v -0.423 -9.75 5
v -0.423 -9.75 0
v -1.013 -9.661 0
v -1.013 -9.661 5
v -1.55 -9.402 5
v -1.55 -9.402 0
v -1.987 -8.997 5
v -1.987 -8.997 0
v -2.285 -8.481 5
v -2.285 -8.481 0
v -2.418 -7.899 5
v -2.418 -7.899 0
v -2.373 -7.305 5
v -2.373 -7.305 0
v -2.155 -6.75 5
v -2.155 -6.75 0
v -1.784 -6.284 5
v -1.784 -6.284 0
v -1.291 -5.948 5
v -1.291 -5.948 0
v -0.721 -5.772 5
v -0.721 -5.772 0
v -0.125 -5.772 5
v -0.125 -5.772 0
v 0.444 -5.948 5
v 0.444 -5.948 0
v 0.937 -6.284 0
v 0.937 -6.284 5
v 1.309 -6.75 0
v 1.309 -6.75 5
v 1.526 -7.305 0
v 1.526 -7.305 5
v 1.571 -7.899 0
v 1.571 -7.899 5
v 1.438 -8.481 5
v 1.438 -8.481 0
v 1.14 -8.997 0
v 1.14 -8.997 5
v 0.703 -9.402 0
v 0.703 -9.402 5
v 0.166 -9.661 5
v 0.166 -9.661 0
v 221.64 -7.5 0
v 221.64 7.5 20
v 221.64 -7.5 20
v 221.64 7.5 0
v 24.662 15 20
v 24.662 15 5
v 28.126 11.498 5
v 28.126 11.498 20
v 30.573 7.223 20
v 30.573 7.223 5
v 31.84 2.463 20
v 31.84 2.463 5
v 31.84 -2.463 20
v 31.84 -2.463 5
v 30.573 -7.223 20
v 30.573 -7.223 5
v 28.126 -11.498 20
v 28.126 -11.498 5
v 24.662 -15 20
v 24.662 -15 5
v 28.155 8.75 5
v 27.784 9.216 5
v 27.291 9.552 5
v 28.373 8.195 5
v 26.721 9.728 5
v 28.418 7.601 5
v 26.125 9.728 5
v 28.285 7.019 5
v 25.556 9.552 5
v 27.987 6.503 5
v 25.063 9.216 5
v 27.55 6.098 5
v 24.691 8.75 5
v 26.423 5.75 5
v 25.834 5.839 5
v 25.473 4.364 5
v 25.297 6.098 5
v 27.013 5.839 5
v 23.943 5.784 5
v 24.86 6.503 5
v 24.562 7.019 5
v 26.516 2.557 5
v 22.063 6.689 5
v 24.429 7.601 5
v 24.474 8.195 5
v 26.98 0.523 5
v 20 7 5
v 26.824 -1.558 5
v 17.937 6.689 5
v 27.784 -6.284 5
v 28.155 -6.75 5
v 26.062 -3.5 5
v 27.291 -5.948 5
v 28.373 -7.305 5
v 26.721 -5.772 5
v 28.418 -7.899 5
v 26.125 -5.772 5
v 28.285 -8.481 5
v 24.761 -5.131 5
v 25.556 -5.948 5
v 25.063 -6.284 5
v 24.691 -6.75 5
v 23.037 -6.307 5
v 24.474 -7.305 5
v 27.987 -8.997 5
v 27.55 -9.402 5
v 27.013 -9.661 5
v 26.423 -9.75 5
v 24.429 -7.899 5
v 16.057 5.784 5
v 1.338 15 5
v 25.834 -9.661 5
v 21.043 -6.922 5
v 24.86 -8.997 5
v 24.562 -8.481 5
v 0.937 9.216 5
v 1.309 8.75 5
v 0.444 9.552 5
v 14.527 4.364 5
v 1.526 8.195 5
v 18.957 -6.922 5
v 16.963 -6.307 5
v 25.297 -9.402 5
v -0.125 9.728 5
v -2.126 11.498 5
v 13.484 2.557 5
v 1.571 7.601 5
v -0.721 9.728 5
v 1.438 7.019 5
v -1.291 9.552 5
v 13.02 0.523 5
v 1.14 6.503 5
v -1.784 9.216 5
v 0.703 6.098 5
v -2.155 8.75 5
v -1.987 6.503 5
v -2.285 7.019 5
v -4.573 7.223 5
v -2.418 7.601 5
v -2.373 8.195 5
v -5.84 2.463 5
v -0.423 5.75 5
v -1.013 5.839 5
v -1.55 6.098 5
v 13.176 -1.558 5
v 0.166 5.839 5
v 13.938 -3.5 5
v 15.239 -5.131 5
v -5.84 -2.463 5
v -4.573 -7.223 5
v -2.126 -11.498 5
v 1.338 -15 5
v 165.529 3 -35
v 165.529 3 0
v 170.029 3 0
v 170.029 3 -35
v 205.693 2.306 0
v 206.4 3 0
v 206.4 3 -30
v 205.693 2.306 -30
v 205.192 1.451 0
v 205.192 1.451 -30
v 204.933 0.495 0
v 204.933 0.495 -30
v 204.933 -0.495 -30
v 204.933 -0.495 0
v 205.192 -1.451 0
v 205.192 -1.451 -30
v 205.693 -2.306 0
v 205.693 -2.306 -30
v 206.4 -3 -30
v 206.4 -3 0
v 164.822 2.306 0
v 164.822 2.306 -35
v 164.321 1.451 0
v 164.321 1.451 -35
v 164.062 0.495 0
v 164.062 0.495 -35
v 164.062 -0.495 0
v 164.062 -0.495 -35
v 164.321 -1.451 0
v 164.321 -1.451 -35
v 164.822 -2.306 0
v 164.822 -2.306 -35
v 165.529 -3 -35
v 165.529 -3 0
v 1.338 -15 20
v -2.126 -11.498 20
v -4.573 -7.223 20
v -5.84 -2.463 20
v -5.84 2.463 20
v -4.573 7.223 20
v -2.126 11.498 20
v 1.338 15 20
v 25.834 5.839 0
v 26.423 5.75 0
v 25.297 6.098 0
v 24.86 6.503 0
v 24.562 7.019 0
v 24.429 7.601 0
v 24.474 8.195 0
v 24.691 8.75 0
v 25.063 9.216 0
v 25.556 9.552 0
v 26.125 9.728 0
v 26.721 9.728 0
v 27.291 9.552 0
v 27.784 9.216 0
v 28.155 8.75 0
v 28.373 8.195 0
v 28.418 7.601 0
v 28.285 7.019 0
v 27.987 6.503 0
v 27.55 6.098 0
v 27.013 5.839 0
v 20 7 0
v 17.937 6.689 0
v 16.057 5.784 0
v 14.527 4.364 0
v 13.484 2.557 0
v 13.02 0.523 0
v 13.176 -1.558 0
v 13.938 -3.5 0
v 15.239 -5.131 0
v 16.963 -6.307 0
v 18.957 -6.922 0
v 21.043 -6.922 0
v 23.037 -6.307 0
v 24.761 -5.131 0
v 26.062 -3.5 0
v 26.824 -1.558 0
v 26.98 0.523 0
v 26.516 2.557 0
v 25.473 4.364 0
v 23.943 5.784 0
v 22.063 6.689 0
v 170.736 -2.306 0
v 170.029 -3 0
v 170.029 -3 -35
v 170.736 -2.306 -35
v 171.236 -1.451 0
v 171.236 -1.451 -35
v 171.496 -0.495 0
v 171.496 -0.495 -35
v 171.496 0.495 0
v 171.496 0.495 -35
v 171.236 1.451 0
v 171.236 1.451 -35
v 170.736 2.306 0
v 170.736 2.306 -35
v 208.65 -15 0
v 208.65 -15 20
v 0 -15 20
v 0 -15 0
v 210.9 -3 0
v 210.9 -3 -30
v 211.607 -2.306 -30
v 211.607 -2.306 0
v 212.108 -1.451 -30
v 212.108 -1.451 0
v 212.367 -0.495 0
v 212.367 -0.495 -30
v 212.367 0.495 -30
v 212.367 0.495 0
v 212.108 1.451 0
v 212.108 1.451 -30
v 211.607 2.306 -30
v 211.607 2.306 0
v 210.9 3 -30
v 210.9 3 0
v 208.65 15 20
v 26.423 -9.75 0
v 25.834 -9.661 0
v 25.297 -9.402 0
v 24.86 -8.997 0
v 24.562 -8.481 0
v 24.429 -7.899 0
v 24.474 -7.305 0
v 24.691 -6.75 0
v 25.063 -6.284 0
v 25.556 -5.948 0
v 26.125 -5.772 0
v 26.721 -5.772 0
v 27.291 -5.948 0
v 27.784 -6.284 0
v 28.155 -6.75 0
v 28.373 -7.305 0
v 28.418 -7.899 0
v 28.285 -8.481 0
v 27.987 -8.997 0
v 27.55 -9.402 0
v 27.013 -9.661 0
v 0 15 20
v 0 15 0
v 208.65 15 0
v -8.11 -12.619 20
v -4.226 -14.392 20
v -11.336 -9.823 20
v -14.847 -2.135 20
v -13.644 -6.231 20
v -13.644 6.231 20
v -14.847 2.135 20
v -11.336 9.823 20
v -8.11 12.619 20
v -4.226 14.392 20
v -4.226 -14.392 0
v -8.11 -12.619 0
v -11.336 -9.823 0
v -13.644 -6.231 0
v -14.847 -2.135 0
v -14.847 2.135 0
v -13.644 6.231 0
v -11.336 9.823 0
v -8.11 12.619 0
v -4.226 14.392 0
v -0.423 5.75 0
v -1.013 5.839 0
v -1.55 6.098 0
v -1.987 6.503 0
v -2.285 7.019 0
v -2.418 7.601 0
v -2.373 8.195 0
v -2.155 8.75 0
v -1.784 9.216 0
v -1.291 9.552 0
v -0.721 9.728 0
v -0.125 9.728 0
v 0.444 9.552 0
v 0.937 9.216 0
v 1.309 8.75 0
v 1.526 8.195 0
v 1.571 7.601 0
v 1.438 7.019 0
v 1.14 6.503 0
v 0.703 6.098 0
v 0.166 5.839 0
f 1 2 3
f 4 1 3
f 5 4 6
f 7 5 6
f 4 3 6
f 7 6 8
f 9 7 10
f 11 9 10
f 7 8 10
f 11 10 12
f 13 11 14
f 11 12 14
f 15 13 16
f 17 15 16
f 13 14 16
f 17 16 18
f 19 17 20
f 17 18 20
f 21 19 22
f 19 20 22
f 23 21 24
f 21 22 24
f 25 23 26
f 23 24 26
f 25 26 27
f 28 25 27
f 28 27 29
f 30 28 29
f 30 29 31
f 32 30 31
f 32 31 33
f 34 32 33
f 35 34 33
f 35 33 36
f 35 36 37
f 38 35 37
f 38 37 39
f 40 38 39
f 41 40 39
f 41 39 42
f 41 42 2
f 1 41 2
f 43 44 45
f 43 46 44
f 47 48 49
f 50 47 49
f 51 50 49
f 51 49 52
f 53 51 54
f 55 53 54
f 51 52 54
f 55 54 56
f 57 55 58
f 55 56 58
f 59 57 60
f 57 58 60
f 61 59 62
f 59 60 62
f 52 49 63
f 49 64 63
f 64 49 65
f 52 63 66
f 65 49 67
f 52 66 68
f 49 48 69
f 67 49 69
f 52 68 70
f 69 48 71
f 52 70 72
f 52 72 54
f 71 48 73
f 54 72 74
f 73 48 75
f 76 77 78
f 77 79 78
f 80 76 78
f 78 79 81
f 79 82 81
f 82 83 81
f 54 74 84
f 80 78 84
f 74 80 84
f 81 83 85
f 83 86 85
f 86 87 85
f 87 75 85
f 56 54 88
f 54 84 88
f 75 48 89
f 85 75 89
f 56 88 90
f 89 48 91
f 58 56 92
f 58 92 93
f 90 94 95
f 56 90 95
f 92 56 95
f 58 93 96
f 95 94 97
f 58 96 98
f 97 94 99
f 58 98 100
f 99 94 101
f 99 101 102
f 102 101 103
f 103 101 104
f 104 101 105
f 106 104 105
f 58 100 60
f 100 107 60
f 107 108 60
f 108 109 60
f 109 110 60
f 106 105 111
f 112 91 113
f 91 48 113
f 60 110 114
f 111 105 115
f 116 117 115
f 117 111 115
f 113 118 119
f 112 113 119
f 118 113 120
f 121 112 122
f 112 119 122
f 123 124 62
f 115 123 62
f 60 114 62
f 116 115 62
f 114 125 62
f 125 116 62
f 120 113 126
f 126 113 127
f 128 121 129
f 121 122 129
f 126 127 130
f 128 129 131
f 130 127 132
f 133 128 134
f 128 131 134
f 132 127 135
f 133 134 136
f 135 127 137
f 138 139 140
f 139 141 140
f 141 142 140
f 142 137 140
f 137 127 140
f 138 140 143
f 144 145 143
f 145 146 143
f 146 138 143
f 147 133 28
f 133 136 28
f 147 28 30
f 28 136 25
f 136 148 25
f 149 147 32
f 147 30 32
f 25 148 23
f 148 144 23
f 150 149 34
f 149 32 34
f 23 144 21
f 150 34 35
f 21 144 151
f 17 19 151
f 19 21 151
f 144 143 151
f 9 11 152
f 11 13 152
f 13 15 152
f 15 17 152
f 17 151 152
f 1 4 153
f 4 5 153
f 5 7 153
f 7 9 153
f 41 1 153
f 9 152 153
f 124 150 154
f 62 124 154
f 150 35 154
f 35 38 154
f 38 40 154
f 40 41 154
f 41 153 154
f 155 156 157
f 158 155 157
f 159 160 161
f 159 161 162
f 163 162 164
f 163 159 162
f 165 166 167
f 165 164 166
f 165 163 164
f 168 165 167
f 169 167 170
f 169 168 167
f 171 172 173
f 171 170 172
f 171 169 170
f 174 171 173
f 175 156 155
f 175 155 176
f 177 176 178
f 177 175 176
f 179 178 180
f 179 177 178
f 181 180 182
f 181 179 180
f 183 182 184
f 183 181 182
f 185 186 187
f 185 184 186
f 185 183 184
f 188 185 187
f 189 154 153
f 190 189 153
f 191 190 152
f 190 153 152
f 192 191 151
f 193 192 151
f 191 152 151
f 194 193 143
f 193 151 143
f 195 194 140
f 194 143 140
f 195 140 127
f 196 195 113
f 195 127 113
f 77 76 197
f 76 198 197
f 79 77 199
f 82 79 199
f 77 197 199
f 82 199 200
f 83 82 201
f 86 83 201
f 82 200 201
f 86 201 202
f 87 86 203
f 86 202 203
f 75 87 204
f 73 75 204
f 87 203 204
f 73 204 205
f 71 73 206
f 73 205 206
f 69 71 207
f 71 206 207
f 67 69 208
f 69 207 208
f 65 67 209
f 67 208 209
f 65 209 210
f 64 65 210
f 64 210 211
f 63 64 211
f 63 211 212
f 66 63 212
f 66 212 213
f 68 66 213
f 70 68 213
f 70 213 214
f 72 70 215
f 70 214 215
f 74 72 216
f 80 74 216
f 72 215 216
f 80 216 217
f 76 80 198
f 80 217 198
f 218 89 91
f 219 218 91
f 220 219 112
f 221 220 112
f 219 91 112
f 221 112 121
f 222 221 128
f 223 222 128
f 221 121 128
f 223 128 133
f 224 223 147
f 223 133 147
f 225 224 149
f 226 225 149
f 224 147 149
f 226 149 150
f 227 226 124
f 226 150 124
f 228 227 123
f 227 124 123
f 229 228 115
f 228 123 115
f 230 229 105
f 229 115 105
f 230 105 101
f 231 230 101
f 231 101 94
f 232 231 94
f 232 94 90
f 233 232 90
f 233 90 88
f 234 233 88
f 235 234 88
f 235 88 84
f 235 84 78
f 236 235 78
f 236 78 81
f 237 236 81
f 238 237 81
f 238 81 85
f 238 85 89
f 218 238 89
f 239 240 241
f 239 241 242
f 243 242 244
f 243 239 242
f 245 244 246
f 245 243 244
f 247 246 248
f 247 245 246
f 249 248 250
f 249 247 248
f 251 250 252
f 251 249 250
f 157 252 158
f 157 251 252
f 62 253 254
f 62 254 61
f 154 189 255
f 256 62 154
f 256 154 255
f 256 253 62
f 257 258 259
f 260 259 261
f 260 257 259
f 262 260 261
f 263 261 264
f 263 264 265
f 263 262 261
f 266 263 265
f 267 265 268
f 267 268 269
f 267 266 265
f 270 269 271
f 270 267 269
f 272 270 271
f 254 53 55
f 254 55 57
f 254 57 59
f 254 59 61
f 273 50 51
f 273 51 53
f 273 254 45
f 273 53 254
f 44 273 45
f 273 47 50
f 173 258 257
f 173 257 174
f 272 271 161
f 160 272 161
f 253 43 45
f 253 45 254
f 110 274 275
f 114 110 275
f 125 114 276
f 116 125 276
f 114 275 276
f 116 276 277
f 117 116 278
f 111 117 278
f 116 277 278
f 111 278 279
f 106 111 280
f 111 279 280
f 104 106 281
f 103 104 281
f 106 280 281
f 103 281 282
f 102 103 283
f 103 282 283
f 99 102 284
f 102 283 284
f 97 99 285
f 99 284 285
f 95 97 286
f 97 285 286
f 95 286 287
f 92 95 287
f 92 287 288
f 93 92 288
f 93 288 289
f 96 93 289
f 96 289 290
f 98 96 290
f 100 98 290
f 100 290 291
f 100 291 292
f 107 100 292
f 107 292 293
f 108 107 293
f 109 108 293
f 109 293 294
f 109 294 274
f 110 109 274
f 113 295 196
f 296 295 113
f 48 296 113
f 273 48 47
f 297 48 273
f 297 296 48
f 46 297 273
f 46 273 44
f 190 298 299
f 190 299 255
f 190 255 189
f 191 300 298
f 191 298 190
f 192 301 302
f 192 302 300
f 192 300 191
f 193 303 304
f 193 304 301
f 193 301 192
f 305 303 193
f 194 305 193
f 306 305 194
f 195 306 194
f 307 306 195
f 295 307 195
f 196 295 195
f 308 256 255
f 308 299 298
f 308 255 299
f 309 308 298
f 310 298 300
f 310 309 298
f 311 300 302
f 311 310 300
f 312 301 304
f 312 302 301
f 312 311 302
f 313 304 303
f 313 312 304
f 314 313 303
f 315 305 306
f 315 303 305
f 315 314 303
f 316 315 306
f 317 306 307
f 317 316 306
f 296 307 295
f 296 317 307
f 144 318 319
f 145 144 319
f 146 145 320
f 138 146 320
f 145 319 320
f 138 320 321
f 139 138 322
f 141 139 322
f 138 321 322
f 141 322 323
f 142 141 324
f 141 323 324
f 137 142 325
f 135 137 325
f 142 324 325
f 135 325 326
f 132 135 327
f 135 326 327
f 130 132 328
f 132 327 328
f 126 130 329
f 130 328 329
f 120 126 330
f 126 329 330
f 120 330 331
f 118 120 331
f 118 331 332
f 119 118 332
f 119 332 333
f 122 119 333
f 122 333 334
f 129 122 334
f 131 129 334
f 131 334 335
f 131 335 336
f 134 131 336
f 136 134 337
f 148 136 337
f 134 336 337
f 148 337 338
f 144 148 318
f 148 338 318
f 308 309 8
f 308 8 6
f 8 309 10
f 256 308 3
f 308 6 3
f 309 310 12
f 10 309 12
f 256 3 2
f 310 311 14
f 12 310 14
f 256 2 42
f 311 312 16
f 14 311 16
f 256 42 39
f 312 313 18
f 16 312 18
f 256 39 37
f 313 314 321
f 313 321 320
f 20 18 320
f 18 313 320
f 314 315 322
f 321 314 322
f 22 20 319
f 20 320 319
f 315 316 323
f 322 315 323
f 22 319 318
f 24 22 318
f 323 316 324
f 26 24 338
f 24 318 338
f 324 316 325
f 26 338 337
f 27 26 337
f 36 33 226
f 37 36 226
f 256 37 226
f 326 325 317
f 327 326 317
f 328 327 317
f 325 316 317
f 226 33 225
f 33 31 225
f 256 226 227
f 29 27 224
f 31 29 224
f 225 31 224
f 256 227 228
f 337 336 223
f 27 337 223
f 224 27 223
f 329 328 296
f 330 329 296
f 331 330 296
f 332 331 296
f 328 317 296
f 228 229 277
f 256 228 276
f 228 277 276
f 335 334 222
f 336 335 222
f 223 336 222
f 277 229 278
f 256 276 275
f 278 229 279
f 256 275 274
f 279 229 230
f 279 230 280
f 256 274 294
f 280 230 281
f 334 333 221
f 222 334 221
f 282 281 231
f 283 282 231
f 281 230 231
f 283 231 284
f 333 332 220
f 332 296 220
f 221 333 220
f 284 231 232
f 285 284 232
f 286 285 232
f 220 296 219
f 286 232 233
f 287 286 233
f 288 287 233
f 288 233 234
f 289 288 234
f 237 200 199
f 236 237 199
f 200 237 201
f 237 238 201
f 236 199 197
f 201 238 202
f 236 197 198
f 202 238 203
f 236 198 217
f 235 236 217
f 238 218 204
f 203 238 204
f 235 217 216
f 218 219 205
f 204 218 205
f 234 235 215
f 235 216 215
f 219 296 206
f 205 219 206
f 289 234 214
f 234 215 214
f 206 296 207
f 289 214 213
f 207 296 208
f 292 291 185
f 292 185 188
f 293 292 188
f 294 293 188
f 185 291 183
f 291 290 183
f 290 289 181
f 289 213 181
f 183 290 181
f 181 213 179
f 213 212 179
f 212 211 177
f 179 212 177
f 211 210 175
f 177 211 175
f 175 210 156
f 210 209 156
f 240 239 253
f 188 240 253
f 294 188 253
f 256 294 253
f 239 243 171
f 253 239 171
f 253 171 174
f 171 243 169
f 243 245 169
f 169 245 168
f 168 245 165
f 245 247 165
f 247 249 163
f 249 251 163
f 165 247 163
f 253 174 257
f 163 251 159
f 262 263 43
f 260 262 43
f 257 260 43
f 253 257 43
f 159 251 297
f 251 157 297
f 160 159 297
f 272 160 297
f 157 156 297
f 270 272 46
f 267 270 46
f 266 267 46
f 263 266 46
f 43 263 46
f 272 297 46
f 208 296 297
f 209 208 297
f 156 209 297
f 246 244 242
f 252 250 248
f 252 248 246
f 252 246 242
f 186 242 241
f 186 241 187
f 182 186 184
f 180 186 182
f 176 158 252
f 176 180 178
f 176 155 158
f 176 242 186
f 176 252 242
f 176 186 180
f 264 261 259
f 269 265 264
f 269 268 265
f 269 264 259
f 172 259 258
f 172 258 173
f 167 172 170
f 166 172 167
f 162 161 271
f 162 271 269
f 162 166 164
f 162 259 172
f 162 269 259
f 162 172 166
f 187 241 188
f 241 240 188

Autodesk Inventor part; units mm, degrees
ref_plane "YZ Plane" through (0, 0, 0) normal (1, 0, 0) x (0, 1, 0)
ref_plane "XZ Plane" through (0, 0, 0) normal (0, 1, 0) x (-1, 0, 0)
ref_plane "XY Plane" through (0, 0, 0) normal (0, 0, 1) x (1, 0, 0)
sketch "Sketch1" plane through (0, 0, 0) normal (0, 0, 1) x (1, 0, 0)
  circle A0 centre (0, 0) radius 15
  circle A1 centre (208.6498, 0) radius 15
  line L0 (0, 15) -> (208.6498, 15)
  line L1 (208.6498, -15) -> (0, -15)
  line L2 (208.6498, 15) -> (221.6402, 7.5)
  line L3 (221.6402, 7.5) -> (221.6402, -7.5)
  line L4 (221.6402, -7.5) -> (208.6498, -15)
  point P0 (208.6498, -15)
  dimension "d0" = 30
  dimension "d1" = 208.6498
  dimension "d16" = 180
extrude "Extrusion1" add sketch "Sketch1" along normal blind 20 contours A0 | A0 L0 A1 L1 | L2 L3 L4 A1
sketch "Sketch2" plane through (0, 0, 0) normal (0, 0, -1) x (-1, 0, 0)
  circle A0 centre (-208.6498, 0) radius 3.75
  circle A1 centre (-167.7787, 0) radius 3.75
  line L0 (-210.8998, 3) -> (-165.5287, 3)
  line L1 (-210.8998, -3) -> (-165.5287, -3)
  line L2 (63.328, 0) -> (-274.9682, 0) projected
  line L3 (-221.6402, -7.5) -> (-221.6402, 7.5) projected
  point P0 (0, 0)
  point P1 (-170.0287, 3)
  point P2 (-170.0287, -3)
  point P3 (-206.3998, 3)
  point P4 (-206.3998, -3)
  point P5 (-208.6498, 15)
  point P6 (-221.6402, 0)
  dimension "d7" = 7.5
  dimension "d8" = 40.8711
  dimension "d11" = 6
extrude "Extrusion2" add sketch "Sketch2" along normal blind 30 contours L2 A0 L0 | A0 L1 L2 | L2 A1 L1 | A1 L0 L2
sketch "Sketch3" plane through (0, 0, 0) normal (0, 0, -1) x (-1, 0, 0)
  arc A0 (-210.8998, 3) -> (-210.8998, -3) centre (-208.6498, 0) ccw projected
  point P0 (0, 0)
  point P1 (-20, 0)
  dimension "d18" = 188.6498
hole "Hole1" at (20, 0, 0) direction (0, 0, 1) diameter 14 end through all
sketch "Sketch5" plane through (0, 0, 20) normal (0, 0, 1) x (1, 0, 0)
  circle A0 centre (20, 0) radius 7 projected
  point P0 (0, 0)
  point P1 (13, 0)
  dimension "d34" = 7
hole "Hole3" at (13, 0, 20) direction (0, 0, -1) diameter 38 depth 15
sketch "Sketch6" plane through (1.3381, -15, 5) normal (0, 0, 1) x (1, 0, 0)
  arc A0 (23.3238, 0) -> (23.3238, 30) centre (11.6619, 15) ccw construction
  line L0 (30.6619, 15) -> (-7.3381, 15) construction
  arc A1 (0, 30) -> (0, 0) centre (11.6619, 15) ccw construction
  circle A2 centre (11.6619, 15) radius 15.5 construction
  point P0 (-1.3381, 15)
  point P1 (25.0853, 22.75)
  point P2 (25.0853, 7.25)
  point P3 (-1.7615, 22.75)
  point P4 (-1.7615, 7.25)
  dimension "d42" = 15.5
  dimension "d43" = 31
  dimension "d44" = 15.5
hole "Hole4" at (26.4234, 7.75, 5) at (26.4234, -7.75, 5) at (-0.4234, 7.75, 5) at (-0.4234, -7.75, 5) direction (0, 0, -1) diameter 4 end through all
sketch "Sketch7" plane through (0, 0, -30) normal (0, 0, -1) x (-1, 0, 0)
  line L0 (-165.5287, 3) -> (-170.0287, 3) projected
  arc A0 (-170.0287, 3) -> (-170.0287, -3) centre (-167.7787, 0) ccw projected
  line L1 (-170.0287, -3) -> (-165.5287, -3) projected
  arc A1 (-165.5287, -3) -> (-165.5287, 3) centre (-167.7787, 0) ccw projected
  point P0 (0, 0)
extrude "Extrusion3" add sketch "Sketch7" along normal blind 5
properties part number "LOWER_LINKAGE" material "ABS Plastic"
